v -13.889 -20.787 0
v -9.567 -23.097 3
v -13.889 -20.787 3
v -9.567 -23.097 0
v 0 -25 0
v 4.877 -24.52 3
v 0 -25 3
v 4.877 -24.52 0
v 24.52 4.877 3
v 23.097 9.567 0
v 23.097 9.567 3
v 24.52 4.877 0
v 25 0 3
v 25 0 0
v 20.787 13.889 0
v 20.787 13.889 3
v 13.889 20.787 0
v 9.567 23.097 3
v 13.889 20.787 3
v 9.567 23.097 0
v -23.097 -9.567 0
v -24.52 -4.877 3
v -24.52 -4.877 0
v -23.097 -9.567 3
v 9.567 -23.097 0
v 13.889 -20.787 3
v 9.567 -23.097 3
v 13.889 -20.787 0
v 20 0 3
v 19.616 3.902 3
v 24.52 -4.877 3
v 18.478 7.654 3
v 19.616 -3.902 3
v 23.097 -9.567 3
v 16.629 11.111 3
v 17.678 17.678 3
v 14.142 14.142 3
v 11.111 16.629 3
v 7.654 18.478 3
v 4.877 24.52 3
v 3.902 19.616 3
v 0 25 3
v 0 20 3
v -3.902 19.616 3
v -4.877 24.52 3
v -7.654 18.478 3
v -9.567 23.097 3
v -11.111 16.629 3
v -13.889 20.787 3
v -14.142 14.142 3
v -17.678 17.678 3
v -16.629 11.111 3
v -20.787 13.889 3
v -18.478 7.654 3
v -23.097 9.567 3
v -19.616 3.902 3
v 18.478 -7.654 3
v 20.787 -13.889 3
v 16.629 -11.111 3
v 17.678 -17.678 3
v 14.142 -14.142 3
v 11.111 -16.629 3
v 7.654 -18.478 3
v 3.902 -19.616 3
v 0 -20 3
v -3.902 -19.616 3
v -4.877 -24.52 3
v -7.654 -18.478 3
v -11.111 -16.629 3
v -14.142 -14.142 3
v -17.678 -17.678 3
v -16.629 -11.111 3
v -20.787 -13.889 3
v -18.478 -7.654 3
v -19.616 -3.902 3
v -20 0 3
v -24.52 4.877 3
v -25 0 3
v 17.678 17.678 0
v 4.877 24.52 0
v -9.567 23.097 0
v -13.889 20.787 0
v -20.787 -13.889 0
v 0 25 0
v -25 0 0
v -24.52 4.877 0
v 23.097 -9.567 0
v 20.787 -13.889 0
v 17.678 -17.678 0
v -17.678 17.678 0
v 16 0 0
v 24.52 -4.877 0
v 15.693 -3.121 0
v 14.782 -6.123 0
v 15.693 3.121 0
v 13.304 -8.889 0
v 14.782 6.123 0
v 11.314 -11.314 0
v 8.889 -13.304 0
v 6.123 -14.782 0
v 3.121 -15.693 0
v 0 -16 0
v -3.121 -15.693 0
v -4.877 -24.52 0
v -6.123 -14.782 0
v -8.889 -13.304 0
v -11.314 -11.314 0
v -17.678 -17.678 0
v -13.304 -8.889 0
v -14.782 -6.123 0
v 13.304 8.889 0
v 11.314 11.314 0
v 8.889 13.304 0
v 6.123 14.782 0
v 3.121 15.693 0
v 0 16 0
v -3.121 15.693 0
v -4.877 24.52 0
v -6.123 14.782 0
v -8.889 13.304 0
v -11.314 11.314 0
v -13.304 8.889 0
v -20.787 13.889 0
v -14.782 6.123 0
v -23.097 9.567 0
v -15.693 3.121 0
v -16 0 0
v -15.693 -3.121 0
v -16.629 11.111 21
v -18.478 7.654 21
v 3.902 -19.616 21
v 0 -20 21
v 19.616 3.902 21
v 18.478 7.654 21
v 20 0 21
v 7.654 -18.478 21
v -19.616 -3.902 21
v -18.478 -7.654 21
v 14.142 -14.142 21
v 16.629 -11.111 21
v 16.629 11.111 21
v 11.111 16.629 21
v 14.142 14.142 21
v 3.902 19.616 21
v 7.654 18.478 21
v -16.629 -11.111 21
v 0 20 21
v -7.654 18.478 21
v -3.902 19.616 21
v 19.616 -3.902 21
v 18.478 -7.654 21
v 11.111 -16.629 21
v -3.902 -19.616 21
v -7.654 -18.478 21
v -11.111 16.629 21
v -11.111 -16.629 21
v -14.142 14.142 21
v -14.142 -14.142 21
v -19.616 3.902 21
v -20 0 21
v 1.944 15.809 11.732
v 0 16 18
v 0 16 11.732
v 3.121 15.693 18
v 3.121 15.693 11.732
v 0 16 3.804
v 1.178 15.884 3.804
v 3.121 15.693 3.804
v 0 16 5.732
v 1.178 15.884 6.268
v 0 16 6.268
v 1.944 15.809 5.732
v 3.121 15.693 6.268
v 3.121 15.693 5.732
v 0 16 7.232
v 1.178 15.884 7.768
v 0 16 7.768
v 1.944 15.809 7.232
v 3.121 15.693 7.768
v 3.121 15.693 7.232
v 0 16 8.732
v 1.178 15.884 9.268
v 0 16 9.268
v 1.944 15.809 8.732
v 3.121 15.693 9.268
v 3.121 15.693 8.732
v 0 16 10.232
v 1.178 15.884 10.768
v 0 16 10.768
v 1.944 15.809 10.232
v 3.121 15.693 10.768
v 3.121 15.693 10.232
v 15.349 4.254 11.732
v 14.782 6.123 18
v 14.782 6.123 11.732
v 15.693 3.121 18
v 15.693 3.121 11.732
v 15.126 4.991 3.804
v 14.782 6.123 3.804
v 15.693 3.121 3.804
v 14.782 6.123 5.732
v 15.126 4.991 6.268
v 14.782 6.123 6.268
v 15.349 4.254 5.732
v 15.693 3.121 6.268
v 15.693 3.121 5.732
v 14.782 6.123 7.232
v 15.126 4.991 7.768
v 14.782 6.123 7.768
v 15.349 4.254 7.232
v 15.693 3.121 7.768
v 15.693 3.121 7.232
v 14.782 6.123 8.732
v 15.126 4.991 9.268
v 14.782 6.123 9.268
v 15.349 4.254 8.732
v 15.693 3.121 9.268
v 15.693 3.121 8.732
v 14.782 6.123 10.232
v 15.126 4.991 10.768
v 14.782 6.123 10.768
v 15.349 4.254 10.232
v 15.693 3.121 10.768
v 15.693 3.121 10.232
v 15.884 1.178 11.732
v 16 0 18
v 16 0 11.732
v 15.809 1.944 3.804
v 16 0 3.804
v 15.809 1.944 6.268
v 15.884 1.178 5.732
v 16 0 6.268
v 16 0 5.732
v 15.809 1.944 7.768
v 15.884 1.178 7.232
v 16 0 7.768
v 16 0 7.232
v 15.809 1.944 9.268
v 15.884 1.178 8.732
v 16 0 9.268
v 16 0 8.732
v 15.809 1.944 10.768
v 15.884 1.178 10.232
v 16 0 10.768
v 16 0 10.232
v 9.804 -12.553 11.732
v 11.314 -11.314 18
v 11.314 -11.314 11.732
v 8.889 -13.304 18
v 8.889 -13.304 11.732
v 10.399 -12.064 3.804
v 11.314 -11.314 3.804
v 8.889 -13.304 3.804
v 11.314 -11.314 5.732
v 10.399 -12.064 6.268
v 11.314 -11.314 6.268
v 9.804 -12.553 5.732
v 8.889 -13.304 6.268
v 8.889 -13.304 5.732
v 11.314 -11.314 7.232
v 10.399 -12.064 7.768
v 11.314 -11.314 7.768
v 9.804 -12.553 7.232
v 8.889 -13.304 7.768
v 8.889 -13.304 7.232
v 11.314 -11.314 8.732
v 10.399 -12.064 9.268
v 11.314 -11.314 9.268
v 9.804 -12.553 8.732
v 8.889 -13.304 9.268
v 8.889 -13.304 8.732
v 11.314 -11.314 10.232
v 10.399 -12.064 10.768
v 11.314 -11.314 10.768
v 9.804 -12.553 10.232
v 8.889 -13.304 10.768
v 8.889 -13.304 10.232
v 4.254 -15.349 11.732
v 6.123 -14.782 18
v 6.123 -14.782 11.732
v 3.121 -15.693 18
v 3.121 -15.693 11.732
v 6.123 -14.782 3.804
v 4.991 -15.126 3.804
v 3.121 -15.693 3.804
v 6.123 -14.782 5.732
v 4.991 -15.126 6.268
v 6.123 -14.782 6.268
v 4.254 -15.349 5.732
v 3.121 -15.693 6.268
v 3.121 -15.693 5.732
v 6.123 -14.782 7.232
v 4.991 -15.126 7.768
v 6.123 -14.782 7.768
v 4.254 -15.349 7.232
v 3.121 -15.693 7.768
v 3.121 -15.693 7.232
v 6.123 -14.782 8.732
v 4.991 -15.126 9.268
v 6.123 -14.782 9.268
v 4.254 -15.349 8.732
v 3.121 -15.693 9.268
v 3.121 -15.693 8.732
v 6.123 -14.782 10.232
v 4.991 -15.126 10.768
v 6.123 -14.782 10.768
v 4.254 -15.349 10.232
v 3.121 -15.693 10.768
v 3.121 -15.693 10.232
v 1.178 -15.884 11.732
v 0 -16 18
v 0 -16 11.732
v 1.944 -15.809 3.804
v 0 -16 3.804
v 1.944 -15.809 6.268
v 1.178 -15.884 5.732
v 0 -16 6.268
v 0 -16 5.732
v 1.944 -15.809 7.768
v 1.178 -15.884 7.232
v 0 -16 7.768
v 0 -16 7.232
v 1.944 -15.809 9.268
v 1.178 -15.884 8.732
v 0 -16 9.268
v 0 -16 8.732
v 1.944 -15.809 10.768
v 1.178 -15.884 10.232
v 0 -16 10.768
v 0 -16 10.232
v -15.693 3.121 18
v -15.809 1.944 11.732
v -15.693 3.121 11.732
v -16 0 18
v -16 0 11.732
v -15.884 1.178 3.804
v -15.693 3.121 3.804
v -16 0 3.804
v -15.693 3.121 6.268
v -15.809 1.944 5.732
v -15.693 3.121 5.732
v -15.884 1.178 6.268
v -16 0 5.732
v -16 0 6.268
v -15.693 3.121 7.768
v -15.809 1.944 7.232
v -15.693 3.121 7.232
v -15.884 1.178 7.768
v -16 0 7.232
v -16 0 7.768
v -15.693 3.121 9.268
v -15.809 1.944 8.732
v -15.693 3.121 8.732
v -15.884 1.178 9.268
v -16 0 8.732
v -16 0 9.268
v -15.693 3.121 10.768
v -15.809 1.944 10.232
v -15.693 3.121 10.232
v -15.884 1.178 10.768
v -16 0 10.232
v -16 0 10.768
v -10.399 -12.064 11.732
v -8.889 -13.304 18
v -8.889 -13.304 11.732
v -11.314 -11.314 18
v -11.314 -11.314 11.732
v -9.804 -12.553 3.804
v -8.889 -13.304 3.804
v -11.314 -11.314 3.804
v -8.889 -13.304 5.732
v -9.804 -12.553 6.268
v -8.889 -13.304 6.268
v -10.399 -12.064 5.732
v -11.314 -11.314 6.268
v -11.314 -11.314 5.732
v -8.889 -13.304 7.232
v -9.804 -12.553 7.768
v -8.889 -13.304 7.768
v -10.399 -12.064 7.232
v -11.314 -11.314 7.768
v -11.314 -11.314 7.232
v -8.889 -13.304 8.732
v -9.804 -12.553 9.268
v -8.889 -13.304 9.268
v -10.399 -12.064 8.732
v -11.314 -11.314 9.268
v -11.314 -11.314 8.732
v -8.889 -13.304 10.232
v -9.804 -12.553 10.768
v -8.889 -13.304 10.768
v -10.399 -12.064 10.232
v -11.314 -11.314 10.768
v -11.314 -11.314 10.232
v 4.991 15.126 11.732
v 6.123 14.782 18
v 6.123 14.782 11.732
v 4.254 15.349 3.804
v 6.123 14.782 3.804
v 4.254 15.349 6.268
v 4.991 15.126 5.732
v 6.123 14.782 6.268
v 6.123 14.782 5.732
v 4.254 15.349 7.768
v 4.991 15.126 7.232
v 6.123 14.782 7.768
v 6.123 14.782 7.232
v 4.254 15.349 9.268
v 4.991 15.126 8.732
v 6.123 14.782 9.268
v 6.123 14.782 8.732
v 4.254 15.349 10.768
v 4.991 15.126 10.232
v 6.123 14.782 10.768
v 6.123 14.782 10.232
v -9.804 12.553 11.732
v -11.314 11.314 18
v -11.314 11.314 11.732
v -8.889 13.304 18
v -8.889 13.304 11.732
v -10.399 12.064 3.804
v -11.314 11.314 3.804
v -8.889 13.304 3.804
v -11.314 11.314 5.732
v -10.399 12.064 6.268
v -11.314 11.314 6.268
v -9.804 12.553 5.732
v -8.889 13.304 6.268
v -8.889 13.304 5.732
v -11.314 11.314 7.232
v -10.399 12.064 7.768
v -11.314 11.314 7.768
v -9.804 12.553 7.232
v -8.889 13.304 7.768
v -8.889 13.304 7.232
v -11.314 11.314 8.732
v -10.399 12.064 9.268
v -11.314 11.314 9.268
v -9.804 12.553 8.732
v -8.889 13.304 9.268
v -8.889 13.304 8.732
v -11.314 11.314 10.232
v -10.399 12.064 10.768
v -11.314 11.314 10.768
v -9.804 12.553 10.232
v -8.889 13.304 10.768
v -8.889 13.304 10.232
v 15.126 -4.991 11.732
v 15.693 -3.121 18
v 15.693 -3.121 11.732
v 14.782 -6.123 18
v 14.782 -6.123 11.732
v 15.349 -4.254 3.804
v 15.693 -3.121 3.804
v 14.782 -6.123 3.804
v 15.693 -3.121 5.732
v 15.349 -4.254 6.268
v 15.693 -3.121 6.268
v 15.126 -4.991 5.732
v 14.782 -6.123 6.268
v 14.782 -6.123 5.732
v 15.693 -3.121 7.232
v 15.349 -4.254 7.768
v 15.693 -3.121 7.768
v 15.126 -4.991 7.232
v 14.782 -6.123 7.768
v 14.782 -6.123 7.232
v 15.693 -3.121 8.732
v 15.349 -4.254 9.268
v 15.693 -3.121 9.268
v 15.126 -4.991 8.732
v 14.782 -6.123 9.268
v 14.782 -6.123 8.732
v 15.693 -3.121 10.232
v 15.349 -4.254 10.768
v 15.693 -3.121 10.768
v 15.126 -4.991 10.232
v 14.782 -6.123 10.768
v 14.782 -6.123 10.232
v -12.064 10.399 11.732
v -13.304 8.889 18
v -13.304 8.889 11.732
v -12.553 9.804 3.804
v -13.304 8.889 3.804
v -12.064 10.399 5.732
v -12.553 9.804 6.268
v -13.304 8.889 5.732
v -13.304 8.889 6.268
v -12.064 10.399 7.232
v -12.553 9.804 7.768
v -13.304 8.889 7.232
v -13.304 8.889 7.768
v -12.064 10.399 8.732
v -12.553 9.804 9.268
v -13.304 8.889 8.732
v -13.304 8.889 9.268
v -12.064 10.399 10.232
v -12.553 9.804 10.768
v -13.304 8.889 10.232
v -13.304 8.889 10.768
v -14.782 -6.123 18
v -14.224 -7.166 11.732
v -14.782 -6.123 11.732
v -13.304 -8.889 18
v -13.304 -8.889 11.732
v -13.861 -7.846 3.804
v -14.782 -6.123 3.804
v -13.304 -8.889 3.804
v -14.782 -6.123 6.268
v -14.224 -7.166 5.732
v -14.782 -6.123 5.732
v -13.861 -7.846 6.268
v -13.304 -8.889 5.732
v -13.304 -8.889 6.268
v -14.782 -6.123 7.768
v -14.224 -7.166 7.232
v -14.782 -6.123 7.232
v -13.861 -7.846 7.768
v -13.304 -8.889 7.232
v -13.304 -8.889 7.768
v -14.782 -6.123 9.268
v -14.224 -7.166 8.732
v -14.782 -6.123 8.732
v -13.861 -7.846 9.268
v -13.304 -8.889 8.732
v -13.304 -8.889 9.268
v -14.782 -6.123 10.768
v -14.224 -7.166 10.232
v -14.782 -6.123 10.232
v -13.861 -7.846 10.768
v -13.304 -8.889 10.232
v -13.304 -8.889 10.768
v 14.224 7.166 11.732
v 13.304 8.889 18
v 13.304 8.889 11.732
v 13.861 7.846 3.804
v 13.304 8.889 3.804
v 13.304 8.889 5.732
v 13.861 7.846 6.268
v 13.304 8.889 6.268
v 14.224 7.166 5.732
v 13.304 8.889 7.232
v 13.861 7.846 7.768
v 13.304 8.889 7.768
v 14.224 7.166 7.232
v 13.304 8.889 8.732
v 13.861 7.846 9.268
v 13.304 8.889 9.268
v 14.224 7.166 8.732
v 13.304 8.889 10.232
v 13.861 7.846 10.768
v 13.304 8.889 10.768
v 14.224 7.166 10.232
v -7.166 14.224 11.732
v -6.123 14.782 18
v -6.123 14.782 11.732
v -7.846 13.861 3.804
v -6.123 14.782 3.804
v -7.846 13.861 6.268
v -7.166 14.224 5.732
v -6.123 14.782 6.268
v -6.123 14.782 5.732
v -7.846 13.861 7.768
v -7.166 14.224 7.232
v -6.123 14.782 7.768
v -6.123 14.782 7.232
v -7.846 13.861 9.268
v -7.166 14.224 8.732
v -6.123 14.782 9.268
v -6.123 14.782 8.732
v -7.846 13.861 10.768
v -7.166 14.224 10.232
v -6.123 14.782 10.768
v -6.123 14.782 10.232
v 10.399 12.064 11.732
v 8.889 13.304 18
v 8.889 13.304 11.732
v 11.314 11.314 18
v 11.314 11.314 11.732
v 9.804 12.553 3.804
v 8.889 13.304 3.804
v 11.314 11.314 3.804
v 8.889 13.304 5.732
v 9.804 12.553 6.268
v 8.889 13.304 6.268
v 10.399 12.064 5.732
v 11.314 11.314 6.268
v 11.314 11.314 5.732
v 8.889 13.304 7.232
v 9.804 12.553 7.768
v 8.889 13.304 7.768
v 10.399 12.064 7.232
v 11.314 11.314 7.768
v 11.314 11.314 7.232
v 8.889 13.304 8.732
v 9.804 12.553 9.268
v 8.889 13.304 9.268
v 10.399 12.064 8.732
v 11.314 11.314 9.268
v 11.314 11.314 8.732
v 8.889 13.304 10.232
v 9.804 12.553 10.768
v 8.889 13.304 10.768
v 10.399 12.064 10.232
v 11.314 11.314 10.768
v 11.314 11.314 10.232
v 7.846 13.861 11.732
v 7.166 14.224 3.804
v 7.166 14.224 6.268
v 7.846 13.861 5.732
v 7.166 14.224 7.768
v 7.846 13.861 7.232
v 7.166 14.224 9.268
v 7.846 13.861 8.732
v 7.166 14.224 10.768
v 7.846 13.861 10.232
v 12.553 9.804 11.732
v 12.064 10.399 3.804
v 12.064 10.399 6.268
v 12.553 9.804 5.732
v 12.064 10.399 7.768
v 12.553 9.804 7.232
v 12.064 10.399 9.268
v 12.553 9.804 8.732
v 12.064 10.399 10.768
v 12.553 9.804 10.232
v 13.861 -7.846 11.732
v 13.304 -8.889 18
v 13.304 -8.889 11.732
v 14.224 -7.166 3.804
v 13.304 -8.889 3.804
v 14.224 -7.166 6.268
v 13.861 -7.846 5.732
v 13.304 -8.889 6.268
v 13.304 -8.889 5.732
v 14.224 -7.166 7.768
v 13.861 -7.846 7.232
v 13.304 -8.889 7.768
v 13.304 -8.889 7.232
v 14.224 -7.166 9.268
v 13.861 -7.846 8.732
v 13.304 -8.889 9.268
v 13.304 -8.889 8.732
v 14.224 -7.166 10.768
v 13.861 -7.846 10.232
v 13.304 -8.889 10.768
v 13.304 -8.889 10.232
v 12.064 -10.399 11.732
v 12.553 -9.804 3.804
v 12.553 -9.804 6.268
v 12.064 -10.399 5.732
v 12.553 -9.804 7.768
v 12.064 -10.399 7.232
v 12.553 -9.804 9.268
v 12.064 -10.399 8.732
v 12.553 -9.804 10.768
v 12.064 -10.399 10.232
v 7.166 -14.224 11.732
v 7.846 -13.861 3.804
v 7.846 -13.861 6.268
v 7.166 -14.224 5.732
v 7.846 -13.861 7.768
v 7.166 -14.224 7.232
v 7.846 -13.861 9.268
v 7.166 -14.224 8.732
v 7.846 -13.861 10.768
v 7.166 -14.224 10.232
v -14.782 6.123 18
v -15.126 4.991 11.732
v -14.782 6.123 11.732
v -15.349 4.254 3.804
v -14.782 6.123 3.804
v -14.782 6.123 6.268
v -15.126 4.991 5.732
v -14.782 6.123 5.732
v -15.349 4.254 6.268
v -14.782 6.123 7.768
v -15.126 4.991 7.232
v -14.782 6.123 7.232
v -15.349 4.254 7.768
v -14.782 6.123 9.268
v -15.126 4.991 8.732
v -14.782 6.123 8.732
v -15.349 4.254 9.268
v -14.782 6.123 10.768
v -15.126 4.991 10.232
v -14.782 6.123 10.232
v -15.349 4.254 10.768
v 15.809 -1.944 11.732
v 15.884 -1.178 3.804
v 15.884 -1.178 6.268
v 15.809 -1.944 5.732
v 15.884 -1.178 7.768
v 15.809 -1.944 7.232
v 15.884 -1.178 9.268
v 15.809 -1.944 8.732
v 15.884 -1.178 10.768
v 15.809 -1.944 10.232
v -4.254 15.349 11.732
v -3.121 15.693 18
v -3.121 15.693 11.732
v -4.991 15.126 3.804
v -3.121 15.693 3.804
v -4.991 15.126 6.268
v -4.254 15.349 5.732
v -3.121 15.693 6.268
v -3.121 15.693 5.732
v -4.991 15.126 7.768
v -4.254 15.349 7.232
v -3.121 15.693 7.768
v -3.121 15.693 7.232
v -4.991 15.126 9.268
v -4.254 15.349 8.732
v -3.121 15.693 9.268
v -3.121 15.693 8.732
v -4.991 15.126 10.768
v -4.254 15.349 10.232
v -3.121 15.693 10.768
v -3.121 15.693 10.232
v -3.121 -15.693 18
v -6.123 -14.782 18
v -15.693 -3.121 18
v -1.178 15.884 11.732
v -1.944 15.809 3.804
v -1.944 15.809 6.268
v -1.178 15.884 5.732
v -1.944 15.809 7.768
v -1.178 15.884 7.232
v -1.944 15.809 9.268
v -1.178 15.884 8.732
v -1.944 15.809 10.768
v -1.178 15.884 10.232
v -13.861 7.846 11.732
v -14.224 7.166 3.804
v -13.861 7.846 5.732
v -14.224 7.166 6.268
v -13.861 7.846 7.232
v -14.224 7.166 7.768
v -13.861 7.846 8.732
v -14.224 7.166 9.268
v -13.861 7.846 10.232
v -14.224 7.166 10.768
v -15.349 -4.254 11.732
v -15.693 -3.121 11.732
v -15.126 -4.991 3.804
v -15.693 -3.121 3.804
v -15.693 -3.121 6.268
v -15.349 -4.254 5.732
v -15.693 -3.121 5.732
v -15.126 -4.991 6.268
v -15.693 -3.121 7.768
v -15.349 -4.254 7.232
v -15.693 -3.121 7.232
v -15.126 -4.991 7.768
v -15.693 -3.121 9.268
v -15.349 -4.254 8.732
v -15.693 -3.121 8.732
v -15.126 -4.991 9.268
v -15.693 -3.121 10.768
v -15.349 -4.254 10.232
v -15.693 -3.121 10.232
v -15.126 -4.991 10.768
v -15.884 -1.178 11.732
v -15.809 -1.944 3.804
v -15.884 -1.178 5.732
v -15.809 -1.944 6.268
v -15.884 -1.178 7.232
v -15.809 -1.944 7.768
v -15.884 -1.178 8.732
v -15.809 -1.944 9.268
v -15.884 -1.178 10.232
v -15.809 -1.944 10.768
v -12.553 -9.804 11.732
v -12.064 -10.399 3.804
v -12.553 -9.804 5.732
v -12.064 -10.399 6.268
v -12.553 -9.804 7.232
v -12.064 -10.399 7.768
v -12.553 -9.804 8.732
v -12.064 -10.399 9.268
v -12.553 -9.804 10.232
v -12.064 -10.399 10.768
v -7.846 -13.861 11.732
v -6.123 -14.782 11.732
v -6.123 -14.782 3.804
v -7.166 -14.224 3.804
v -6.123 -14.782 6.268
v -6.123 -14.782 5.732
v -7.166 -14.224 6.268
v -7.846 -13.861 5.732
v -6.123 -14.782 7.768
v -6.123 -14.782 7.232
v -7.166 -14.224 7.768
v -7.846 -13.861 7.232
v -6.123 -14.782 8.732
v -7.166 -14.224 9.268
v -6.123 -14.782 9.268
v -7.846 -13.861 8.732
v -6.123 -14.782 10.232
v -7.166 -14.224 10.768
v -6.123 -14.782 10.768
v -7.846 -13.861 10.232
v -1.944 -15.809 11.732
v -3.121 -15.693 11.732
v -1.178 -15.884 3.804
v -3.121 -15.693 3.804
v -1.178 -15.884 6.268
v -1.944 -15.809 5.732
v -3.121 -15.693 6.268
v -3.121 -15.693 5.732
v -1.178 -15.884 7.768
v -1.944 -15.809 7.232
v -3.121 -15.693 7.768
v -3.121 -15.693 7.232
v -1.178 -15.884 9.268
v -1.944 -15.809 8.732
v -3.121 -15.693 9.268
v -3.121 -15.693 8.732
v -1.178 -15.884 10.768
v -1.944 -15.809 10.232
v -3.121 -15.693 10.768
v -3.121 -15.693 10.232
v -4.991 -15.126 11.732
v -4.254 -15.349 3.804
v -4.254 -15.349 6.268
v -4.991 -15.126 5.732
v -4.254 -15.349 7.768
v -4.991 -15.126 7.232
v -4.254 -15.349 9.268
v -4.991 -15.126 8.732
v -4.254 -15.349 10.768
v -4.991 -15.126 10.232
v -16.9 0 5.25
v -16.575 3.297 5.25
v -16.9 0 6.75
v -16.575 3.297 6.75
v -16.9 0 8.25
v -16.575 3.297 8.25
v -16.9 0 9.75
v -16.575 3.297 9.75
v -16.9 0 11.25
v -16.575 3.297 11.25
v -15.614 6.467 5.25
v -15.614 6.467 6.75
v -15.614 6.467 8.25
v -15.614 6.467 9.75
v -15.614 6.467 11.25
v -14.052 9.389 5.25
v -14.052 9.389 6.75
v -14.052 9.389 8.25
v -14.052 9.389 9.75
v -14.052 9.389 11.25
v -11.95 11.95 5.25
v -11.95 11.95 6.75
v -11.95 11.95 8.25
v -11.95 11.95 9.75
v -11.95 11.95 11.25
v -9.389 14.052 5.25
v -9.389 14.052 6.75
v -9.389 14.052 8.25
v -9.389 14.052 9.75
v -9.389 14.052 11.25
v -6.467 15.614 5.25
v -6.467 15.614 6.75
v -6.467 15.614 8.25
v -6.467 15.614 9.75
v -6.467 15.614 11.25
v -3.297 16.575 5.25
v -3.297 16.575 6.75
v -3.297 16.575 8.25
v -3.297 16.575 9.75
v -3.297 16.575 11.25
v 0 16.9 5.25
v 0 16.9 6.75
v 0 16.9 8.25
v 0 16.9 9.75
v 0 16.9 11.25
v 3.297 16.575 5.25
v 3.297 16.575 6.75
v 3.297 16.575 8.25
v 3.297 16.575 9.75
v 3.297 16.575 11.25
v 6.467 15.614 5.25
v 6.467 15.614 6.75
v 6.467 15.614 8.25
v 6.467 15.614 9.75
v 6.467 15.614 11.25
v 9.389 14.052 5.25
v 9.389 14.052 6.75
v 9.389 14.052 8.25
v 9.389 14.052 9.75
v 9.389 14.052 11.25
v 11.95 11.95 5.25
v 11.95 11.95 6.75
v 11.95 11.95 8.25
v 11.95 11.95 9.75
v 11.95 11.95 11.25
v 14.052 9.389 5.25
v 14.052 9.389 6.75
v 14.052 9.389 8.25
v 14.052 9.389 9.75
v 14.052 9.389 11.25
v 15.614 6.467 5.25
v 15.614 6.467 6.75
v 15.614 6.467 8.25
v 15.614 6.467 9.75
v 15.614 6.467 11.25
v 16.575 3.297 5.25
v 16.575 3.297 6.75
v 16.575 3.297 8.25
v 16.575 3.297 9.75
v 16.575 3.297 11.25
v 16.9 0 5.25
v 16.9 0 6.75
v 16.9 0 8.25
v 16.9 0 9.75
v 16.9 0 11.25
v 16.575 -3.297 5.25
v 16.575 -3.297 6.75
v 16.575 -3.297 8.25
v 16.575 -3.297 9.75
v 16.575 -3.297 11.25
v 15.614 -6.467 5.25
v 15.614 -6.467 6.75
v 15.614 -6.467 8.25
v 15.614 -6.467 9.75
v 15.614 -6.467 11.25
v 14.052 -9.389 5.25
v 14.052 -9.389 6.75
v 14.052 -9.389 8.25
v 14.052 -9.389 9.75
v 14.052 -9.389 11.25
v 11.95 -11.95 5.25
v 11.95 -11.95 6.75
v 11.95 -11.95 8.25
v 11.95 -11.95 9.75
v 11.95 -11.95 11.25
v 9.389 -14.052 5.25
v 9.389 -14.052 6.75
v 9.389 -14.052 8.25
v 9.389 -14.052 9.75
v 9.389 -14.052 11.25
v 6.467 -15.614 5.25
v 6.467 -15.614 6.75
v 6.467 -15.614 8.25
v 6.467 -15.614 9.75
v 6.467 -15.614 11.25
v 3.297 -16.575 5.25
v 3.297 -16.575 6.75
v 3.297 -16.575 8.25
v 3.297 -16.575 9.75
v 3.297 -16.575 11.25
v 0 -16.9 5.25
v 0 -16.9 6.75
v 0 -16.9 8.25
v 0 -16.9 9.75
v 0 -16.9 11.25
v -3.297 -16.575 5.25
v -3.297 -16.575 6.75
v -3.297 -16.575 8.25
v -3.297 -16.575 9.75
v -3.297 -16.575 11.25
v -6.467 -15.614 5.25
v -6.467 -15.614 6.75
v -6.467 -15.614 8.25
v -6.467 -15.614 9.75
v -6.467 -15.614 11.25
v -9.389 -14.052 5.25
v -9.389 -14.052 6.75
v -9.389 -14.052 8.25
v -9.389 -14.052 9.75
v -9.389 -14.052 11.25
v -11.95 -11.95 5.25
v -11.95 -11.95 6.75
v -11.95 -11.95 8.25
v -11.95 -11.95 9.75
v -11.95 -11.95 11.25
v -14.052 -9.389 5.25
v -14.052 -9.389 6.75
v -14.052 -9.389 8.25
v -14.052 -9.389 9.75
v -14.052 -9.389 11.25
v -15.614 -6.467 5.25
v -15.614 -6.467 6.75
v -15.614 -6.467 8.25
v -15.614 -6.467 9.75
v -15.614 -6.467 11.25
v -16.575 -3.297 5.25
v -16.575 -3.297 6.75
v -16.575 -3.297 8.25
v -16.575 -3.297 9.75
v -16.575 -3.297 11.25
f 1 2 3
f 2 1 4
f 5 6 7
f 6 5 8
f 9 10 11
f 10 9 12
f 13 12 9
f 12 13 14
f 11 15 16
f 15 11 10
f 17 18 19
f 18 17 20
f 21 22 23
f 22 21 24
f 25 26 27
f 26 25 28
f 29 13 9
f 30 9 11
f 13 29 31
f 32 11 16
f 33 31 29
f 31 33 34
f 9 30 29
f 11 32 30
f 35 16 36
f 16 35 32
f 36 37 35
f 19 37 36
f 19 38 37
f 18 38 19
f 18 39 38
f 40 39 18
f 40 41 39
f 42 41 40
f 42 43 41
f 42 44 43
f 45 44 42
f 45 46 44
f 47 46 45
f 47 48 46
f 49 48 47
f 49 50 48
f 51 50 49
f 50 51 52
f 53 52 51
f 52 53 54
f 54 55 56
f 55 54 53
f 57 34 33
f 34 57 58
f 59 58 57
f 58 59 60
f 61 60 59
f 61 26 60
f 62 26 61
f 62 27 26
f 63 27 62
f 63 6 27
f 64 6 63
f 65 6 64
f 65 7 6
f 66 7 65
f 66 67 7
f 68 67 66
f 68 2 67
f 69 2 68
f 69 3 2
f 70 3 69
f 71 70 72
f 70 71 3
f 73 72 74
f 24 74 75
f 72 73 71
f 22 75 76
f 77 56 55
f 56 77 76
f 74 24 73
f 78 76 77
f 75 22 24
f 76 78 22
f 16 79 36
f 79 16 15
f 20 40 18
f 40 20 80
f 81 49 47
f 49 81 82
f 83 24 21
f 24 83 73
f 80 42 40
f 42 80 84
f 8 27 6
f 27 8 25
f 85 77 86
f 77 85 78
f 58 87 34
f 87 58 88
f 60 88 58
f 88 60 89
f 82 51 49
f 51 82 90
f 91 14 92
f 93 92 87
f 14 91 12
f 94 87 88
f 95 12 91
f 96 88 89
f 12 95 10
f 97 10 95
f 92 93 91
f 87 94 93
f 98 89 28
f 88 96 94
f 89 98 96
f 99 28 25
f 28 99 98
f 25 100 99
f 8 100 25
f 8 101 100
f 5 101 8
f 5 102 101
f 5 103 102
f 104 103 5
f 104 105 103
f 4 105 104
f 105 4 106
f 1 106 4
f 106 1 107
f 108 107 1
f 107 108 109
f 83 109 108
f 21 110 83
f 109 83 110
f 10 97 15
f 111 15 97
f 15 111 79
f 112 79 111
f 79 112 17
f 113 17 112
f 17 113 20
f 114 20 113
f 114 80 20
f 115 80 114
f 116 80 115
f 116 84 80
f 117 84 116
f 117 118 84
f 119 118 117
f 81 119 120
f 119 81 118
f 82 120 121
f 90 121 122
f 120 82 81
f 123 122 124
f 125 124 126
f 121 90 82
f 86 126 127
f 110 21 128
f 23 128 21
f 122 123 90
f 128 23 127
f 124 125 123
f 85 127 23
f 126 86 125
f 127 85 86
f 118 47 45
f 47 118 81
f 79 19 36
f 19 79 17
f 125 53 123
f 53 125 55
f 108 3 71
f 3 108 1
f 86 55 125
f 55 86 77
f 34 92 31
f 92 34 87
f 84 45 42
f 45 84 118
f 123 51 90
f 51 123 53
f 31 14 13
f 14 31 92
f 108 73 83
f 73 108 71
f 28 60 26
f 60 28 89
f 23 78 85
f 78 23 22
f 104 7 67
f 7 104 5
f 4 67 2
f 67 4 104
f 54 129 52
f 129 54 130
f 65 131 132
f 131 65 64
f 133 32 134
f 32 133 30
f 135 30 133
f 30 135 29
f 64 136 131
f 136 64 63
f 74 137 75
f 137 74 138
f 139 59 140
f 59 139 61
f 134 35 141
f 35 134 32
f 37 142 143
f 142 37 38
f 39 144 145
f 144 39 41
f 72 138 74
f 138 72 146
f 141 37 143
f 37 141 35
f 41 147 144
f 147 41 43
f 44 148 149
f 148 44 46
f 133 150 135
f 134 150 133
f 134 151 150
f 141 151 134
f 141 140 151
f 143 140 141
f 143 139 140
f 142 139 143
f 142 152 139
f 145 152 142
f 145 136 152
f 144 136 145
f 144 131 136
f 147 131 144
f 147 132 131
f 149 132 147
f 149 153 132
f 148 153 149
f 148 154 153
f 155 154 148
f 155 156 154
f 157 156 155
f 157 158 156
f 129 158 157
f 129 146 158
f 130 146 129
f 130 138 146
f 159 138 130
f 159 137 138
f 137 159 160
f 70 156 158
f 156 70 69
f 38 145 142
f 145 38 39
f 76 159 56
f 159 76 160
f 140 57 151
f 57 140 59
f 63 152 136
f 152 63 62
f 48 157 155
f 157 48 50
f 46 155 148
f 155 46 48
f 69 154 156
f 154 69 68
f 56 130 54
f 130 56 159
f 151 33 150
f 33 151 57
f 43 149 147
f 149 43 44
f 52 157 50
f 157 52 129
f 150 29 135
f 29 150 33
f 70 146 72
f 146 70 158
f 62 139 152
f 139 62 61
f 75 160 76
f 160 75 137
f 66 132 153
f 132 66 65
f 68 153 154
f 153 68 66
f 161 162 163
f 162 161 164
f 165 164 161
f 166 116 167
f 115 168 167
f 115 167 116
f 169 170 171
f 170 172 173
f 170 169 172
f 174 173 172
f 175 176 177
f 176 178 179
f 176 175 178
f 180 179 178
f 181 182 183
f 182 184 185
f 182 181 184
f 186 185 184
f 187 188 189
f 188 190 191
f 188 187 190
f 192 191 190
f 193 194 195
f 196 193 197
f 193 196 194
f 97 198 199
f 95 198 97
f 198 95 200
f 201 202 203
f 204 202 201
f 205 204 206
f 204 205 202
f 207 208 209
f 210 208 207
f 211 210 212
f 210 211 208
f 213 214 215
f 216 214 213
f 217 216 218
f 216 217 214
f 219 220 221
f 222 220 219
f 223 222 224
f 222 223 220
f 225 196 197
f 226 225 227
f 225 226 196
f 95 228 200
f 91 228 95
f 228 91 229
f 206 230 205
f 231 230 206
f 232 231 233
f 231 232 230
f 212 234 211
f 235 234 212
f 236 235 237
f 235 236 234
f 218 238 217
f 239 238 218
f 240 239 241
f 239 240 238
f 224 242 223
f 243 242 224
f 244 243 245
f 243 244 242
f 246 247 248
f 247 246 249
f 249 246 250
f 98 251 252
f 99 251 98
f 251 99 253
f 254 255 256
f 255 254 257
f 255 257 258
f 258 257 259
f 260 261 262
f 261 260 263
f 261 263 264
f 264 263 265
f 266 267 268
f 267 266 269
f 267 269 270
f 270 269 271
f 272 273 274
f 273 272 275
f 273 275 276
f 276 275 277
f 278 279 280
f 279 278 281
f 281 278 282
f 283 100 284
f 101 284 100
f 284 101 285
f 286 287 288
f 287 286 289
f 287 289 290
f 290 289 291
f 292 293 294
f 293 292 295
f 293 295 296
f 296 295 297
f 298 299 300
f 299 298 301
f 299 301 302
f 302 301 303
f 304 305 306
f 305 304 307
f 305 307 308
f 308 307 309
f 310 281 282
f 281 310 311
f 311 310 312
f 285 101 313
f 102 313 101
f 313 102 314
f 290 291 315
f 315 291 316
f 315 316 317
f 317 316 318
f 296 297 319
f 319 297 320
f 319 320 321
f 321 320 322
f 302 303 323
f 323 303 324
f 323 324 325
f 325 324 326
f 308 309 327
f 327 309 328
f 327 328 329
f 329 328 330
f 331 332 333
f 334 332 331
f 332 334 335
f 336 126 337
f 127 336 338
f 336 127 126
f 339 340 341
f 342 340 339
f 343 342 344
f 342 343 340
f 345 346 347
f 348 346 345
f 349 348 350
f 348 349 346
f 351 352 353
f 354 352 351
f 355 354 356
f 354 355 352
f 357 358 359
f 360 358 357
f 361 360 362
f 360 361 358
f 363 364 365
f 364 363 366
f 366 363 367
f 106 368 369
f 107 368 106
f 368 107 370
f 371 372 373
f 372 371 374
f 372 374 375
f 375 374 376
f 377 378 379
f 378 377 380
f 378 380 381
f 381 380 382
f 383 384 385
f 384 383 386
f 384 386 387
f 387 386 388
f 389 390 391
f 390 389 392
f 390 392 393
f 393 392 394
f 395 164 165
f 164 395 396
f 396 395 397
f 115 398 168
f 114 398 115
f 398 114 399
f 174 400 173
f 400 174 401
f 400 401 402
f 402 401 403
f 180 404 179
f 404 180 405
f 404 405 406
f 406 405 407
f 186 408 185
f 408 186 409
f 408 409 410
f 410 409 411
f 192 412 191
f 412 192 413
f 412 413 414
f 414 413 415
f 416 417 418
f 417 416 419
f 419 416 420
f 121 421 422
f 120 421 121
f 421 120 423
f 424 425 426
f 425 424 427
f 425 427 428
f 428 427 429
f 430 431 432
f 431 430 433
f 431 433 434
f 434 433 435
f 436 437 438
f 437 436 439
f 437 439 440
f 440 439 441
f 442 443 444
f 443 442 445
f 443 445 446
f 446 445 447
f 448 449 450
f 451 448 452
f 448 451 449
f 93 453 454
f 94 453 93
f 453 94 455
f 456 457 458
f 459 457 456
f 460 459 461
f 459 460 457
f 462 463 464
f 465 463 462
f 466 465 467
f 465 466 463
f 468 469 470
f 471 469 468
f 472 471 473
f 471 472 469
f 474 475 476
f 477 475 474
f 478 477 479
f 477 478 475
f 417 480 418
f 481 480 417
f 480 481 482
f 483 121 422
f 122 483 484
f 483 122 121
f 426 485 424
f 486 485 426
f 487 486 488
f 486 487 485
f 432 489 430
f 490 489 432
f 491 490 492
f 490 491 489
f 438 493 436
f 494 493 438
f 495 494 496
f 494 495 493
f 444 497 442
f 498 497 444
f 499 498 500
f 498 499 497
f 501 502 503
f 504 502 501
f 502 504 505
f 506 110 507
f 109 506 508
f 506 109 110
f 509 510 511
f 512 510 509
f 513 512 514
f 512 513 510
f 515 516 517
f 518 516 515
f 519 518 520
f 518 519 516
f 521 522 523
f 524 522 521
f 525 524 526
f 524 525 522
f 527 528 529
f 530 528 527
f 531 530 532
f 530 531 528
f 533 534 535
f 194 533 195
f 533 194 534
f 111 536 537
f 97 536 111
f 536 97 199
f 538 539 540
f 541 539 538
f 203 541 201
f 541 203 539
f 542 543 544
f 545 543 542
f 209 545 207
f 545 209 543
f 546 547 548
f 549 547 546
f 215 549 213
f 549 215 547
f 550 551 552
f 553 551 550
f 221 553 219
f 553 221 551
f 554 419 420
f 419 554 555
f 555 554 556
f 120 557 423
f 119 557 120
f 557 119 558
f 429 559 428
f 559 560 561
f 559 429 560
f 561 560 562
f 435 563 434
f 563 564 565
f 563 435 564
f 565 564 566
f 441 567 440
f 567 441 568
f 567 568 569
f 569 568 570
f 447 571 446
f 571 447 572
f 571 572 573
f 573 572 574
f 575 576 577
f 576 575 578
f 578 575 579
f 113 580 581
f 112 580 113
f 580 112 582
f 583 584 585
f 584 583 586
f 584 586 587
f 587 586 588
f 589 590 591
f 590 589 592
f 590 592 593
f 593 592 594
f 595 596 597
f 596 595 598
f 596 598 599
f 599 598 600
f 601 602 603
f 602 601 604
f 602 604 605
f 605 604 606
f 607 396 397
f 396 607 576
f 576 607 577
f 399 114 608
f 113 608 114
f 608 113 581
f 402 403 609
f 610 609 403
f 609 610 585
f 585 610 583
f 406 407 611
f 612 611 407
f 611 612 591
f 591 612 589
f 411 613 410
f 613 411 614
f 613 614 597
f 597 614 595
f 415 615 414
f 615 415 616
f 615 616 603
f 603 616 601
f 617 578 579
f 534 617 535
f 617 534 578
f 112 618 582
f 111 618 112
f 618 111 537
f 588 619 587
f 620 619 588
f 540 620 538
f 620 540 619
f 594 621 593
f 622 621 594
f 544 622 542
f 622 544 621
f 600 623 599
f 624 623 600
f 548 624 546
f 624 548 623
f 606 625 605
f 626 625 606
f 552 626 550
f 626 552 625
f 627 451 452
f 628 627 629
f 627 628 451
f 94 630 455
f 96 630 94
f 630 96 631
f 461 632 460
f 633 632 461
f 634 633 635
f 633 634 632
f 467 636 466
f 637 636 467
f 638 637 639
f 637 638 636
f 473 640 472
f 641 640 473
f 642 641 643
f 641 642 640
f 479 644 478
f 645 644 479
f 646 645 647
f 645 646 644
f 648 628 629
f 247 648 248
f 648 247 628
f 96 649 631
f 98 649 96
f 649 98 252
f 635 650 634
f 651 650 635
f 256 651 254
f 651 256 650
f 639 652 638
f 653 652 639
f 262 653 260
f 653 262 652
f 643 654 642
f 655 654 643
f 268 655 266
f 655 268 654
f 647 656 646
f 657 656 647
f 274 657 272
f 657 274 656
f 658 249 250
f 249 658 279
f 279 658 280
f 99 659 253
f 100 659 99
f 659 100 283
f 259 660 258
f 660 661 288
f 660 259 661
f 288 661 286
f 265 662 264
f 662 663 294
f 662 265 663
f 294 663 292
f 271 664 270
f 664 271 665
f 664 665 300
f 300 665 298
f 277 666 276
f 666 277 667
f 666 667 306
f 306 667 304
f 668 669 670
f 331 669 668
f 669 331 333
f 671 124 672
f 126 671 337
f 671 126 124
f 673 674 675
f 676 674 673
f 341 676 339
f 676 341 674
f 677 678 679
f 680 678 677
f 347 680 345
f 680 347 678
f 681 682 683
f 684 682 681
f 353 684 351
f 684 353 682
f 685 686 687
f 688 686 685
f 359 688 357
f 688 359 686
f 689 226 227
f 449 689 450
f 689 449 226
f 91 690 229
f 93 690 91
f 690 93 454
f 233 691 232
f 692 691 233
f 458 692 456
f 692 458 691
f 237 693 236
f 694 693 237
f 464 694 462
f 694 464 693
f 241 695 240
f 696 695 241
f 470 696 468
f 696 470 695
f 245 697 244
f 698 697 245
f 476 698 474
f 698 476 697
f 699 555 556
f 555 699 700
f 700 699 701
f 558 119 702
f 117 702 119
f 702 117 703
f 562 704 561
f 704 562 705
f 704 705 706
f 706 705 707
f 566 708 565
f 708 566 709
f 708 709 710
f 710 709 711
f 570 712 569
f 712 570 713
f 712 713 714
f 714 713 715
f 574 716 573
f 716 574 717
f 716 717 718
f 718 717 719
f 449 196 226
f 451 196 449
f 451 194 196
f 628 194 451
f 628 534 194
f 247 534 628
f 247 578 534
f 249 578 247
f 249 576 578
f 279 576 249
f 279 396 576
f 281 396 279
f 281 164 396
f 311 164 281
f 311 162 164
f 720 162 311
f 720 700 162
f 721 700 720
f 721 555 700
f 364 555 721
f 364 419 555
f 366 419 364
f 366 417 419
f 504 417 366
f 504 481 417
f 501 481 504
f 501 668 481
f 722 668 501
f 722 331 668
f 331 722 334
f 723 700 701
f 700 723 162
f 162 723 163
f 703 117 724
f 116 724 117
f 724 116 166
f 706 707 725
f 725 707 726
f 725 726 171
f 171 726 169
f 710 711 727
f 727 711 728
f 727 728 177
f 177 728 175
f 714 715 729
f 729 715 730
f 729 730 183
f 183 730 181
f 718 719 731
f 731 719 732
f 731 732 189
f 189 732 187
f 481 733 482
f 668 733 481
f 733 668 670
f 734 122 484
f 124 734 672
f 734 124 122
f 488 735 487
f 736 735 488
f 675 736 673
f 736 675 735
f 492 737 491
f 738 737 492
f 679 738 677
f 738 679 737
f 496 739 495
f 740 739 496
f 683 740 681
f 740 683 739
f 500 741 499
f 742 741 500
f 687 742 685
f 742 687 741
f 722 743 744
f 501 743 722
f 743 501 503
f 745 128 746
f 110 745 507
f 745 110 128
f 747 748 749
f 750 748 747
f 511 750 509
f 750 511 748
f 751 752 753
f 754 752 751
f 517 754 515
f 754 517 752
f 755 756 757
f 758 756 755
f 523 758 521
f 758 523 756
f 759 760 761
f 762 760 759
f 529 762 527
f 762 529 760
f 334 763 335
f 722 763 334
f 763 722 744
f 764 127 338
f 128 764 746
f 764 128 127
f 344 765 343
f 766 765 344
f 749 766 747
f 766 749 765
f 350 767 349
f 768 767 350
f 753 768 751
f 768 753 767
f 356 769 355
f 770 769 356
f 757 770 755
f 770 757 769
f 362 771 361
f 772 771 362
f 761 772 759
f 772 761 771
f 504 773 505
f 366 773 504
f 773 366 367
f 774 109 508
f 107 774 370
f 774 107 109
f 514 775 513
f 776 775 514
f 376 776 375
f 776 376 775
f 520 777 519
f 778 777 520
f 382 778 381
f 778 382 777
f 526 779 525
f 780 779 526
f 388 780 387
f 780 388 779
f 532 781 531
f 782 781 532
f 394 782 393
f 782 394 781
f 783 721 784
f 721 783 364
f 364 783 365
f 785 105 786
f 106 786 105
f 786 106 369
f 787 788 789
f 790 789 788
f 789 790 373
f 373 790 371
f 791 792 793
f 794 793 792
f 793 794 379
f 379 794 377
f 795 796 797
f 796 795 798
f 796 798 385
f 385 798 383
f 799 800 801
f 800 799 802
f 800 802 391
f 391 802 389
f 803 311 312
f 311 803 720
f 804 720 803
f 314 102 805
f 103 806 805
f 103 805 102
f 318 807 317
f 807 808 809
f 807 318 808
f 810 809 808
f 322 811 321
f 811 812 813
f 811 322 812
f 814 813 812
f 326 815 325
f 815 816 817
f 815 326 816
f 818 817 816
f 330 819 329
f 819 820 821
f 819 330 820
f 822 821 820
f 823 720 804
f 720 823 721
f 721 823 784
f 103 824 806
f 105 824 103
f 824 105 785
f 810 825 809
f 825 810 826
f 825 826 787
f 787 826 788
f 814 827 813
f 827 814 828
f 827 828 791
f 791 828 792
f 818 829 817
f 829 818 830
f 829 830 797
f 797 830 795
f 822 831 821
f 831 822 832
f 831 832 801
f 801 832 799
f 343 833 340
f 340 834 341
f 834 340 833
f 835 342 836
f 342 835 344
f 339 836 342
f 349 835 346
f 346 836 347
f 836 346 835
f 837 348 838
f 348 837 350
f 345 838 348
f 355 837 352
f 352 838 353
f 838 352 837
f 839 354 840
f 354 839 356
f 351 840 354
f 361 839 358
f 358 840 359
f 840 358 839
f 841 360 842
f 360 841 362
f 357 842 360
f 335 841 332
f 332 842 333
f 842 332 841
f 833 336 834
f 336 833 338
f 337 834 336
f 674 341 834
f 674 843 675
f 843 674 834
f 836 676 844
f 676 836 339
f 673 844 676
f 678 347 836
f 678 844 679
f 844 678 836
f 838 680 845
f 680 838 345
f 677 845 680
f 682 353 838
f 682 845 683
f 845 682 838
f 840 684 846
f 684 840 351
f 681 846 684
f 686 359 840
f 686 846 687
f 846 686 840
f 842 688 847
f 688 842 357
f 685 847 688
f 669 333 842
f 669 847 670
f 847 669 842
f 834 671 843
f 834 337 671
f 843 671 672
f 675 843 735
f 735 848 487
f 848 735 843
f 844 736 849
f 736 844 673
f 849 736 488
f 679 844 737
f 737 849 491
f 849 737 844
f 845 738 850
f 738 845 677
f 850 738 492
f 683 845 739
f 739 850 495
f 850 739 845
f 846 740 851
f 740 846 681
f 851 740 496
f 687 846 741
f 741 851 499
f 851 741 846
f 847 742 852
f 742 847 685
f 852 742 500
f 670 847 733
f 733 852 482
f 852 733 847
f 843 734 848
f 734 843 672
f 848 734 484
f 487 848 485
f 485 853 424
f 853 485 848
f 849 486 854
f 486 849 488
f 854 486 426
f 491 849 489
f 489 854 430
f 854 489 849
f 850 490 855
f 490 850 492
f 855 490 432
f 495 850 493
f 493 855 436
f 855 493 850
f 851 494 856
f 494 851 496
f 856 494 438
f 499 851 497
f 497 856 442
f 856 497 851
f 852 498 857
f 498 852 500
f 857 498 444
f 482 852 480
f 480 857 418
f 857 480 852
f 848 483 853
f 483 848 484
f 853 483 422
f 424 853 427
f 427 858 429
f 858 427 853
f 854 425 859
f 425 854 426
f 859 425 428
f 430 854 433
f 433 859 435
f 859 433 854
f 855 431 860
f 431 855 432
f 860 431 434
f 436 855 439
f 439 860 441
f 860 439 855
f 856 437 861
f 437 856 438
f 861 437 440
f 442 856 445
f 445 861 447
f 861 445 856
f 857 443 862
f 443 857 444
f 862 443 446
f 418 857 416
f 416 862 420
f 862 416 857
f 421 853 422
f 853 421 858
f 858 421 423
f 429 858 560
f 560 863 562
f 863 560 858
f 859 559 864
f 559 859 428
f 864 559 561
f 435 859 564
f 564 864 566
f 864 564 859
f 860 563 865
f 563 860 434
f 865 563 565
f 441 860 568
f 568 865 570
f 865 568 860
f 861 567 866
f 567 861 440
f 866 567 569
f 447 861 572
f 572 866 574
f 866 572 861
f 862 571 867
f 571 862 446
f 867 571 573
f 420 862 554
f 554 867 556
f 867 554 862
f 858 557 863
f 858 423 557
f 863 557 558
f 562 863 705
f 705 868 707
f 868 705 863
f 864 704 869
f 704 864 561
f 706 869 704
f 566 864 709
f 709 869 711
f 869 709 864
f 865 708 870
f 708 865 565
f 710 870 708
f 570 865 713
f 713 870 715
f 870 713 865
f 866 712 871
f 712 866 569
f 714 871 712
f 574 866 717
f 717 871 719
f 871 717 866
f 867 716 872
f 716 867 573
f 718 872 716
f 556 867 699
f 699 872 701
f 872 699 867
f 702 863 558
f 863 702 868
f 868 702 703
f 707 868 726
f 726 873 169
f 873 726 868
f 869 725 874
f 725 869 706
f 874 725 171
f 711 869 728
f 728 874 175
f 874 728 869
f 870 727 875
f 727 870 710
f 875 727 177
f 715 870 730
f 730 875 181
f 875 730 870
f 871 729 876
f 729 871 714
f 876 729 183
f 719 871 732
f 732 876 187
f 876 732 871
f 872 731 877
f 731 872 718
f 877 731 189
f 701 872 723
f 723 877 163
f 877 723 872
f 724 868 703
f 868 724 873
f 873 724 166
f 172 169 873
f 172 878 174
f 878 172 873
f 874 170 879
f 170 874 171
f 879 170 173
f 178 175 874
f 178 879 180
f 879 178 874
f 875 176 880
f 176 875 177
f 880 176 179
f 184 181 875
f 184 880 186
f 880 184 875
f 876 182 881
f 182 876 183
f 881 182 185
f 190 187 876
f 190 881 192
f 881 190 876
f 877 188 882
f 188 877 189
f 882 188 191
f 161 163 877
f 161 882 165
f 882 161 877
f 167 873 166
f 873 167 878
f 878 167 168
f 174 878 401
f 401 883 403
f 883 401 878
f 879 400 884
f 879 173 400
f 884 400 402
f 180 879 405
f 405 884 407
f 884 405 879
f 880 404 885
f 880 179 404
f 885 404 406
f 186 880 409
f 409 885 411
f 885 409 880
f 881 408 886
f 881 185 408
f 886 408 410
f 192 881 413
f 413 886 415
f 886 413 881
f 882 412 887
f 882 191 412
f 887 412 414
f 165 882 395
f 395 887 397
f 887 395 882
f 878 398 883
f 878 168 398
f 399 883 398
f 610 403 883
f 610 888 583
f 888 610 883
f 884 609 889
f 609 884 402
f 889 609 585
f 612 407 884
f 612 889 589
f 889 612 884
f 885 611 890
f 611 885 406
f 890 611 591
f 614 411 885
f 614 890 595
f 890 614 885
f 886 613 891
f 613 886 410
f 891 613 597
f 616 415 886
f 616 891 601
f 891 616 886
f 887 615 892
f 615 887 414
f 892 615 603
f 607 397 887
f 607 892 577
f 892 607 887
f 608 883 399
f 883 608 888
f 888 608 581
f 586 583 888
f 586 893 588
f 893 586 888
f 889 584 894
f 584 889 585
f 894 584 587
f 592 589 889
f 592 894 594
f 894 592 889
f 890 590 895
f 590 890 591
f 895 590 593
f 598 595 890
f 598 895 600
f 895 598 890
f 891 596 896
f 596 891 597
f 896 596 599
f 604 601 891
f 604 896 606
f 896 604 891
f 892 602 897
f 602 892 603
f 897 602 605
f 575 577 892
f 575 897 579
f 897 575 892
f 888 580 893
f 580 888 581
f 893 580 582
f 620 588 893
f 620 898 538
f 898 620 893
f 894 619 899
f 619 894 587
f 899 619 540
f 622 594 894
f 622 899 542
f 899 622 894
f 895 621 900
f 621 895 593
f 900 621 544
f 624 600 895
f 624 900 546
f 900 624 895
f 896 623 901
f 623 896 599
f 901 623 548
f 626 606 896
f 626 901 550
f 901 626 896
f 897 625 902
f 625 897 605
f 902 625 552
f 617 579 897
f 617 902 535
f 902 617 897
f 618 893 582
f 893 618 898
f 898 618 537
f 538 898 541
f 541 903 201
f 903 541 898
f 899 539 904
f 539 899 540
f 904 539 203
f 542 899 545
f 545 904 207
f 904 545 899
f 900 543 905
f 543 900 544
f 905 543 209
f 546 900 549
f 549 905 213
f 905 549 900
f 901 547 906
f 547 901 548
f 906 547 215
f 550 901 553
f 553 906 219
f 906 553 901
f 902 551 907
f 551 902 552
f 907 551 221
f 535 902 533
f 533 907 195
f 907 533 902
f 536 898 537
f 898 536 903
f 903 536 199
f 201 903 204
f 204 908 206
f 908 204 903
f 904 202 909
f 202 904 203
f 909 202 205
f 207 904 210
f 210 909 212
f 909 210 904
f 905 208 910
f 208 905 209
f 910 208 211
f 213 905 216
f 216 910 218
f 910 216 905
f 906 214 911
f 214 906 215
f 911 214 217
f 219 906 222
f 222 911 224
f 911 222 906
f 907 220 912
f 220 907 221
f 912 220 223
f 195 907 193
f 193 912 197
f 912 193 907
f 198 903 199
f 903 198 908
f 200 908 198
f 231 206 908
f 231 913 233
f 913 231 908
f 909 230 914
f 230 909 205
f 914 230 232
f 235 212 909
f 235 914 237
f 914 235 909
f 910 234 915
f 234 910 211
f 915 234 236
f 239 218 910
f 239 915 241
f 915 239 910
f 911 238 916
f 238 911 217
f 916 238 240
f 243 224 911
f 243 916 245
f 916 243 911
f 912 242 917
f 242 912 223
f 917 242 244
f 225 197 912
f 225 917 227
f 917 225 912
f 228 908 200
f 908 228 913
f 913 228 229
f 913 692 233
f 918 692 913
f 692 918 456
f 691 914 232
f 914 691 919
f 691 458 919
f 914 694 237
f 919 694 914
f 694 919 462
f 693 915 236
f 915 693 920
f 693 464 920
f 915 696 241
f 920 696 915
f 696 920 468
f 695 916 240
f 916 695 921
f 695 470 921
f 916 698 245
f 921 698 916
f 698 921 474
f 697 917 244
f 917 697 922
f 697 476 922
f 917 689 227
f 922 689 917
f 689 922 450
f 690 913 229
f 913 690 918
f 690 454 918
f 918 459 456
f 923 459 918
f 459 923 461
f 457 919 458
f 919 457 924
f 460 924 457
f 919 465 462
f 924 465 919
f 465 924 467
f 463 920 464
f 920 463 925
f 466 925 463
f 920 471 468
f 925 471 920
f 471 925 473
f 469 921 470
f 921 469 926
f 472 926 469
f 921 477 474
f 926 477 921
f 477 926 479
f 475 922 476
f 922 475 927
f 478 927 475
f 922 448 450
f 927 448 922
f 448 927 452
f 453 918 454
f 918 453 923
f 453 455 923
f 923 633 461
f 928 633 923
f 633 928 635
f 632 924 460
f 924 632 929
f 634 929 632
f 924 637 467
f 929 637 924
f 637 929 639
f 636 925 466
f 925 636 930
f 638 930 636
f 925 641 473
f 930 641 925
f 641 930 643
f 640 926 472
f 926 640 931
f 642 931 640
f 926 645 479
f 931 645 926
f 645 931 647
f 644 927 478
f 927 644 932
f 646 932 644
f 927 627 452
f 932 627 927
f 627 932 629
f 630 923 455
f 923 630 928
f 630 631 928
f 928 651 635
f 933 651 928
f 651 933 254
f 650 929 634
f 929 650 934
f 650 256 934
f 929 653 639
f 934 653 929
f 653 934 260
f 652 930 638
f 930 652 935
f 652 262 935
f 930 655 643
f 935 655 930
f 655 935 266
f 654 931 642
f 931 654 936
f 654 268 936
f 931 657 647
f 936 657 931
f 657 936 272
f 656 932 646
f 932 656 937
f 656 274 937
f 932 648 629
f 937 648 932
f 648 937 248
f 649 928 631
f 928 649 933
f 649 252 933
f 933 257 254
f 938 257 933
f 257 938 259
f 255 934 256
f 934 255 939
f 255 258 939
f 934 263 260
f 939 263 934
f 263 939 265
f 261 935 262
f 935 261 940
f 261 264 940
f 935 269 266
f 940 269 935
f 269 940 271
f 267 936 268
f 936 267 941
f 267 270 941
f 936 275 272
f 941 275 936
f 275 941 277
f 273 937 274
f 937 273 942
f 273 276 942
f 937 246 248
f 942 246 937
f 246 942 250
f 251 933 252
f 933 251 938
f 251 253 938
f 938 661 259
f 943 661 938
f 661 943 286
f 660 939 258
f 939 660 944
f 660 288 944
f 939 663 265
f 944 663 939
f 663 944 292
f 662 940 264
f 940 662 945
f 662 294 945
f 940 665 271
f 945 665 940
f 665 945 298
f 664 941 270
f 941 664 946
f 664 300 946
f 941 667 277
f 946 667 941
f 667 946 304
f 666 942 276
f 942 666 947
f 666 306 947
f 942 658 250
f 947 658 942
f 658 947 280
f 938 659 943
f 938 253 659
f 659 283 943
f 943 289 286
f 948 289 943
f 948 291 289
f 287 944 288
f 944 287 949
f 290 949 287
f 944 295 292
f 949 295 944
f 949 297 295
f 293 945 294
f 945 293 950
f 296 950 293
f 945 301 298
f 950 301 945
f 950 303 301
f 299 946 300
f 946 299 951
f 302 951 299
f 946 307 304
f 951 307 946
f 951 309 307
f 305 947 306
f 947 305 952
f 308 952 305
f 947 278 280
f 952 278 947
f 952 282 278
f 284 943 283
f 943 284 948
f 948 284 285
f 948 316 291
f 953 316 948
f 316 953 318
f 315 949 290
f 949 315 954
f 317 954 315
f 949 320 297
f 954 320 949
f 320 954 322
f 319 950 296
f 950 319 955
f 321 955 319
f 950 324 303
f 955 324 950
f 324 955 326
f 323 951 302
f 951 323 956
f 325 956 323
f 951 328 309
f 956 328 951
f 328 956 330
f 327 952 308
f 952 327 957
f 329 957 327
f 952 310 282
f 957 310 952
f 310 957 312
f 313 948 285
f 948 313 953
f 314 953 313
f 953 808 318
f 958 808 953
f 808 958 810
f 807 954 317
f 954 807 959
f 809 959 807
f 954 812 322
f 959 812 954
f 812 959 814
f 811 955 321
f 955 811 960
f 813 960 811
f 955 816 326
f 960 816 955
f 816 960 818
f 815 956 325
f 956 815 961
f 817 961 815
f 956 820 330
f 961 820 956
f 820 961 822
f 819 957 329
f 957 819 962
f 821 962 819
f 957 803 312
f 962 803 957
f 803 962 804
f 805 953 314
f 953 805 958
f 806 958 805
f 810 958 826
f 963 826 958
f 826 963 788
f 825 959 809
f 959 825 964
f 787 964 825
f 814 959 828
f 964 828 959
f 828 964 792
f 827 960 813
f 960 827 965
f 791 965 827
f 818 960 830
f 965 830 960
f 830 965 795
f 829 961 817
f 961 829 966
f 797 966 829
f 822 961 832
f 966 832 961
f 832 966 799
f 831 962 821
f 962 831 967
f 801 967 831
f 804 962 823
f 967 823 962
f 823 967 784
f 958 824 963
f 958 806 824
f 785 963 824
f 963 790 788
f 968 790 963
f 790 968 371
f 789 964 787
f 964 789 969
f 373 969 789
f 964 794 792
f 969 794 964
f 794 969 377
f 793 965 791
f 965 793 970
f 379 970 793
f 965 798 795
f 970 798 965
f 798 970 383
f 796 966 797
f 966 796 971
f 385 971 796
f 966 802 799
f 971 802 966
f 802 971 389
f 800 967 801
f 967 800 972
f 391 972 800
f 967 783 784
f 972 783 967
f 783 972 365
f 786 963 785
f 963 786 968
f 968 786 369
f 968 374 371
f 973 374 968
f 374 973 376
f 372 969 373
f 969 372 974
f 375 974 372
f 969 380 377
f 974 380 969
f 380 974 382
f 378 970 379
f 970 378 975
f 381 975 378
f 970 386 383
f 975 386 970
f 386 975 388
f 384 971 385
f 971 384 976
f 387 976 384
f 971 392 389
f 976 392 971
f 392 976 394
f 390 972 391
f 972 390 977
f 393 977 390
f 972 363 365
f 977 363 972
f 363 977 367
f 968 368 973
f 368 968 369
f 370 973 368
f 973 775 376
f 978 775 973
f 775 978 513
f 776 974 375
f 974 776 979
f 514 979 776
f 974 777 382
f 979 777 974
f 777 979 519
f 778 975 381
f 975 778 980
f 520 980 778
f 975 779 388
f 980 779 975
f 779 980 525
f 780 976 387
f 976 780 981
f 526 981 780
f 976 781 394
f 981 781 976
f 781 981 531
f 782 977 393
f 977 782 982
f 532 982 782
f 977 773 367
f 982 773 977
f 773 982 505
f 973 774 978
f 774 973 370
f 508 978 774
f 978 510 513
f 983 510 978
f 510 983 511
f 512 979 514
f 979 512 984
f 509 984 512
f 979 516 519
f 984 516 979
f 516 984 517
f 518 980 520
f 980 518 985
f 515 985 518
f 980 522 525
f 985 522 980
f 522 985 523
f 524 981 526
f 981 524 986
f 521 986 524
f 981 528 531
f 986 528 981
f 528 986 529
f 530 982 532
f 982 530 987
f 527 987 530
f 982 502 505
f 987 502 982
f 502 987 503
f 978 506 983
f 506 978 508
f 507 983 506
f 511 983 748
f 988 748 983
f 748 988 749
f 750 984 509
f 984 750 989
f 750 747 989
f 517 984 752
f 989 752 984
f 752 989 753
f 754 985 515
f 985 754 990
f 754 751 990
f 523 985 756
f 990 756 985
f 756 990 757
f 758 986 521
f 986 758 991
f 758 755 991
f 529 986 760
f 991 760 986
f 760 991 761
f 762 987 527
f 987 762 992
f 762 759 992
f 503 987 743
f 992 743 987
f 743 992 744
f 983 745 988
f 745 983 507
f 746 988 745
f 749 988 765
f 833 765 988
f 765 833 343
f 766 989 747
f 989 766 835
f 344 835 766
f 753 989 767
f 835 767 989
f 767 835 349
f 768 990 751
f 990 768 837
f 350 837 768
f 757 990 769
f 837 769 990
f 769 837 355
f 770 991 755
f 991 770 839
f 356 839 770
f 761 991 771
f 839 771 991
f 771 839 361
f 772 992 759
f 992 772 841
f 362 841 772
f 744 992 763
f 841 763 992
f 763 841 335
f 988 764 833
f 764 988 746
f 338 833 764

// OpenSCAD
$fn = 32;

// ----------------------------------------------------------------------
// Threaded cap: 40 mm body, 18 mm tall, 32 mm threaded bore
// ----------------------------------------------------------------------

// --- parameters (mm) ---
outer_d = 40;             // cap outside diameter
body_h = 18;              // cap height
top_t = 3;                // closed top thickness
bore_d = 32;              // bore core diameter
pitch = 1.5;              // thread pitch
thread_d = 0.9;           // thread depth
thread_z = 3;             // thread start above the rim
thread_h = 9;             // threaded height
flange_d = 50;            // flange diameter
flange_t = 3;             // flange thickness

difference() {
  union() {
    cylinder(h = 3, d = flange_d);
    translate([0, 0, 2.5]) cylinder(h = 18.5, d = outer_d);
  }
  /* threaded bore, closed at the top */
  translate([0, 0, -2.5]) cylinder(h = 20.5, d = bore_d);
  translate([0, 0, 3]) rotate_extrude() polygon([[15, 0], [15, 9], [15.5, 9], [16.9, 8.25], [15.5, 7.5], [16.9, 6.75], [15.5, 6], [16.9, 5.25], [15.5, 4.5], [16.9, 3.75], [15.5, 3], [16.9, 2.25], [15.5, 0], [15, 0]]);
}
